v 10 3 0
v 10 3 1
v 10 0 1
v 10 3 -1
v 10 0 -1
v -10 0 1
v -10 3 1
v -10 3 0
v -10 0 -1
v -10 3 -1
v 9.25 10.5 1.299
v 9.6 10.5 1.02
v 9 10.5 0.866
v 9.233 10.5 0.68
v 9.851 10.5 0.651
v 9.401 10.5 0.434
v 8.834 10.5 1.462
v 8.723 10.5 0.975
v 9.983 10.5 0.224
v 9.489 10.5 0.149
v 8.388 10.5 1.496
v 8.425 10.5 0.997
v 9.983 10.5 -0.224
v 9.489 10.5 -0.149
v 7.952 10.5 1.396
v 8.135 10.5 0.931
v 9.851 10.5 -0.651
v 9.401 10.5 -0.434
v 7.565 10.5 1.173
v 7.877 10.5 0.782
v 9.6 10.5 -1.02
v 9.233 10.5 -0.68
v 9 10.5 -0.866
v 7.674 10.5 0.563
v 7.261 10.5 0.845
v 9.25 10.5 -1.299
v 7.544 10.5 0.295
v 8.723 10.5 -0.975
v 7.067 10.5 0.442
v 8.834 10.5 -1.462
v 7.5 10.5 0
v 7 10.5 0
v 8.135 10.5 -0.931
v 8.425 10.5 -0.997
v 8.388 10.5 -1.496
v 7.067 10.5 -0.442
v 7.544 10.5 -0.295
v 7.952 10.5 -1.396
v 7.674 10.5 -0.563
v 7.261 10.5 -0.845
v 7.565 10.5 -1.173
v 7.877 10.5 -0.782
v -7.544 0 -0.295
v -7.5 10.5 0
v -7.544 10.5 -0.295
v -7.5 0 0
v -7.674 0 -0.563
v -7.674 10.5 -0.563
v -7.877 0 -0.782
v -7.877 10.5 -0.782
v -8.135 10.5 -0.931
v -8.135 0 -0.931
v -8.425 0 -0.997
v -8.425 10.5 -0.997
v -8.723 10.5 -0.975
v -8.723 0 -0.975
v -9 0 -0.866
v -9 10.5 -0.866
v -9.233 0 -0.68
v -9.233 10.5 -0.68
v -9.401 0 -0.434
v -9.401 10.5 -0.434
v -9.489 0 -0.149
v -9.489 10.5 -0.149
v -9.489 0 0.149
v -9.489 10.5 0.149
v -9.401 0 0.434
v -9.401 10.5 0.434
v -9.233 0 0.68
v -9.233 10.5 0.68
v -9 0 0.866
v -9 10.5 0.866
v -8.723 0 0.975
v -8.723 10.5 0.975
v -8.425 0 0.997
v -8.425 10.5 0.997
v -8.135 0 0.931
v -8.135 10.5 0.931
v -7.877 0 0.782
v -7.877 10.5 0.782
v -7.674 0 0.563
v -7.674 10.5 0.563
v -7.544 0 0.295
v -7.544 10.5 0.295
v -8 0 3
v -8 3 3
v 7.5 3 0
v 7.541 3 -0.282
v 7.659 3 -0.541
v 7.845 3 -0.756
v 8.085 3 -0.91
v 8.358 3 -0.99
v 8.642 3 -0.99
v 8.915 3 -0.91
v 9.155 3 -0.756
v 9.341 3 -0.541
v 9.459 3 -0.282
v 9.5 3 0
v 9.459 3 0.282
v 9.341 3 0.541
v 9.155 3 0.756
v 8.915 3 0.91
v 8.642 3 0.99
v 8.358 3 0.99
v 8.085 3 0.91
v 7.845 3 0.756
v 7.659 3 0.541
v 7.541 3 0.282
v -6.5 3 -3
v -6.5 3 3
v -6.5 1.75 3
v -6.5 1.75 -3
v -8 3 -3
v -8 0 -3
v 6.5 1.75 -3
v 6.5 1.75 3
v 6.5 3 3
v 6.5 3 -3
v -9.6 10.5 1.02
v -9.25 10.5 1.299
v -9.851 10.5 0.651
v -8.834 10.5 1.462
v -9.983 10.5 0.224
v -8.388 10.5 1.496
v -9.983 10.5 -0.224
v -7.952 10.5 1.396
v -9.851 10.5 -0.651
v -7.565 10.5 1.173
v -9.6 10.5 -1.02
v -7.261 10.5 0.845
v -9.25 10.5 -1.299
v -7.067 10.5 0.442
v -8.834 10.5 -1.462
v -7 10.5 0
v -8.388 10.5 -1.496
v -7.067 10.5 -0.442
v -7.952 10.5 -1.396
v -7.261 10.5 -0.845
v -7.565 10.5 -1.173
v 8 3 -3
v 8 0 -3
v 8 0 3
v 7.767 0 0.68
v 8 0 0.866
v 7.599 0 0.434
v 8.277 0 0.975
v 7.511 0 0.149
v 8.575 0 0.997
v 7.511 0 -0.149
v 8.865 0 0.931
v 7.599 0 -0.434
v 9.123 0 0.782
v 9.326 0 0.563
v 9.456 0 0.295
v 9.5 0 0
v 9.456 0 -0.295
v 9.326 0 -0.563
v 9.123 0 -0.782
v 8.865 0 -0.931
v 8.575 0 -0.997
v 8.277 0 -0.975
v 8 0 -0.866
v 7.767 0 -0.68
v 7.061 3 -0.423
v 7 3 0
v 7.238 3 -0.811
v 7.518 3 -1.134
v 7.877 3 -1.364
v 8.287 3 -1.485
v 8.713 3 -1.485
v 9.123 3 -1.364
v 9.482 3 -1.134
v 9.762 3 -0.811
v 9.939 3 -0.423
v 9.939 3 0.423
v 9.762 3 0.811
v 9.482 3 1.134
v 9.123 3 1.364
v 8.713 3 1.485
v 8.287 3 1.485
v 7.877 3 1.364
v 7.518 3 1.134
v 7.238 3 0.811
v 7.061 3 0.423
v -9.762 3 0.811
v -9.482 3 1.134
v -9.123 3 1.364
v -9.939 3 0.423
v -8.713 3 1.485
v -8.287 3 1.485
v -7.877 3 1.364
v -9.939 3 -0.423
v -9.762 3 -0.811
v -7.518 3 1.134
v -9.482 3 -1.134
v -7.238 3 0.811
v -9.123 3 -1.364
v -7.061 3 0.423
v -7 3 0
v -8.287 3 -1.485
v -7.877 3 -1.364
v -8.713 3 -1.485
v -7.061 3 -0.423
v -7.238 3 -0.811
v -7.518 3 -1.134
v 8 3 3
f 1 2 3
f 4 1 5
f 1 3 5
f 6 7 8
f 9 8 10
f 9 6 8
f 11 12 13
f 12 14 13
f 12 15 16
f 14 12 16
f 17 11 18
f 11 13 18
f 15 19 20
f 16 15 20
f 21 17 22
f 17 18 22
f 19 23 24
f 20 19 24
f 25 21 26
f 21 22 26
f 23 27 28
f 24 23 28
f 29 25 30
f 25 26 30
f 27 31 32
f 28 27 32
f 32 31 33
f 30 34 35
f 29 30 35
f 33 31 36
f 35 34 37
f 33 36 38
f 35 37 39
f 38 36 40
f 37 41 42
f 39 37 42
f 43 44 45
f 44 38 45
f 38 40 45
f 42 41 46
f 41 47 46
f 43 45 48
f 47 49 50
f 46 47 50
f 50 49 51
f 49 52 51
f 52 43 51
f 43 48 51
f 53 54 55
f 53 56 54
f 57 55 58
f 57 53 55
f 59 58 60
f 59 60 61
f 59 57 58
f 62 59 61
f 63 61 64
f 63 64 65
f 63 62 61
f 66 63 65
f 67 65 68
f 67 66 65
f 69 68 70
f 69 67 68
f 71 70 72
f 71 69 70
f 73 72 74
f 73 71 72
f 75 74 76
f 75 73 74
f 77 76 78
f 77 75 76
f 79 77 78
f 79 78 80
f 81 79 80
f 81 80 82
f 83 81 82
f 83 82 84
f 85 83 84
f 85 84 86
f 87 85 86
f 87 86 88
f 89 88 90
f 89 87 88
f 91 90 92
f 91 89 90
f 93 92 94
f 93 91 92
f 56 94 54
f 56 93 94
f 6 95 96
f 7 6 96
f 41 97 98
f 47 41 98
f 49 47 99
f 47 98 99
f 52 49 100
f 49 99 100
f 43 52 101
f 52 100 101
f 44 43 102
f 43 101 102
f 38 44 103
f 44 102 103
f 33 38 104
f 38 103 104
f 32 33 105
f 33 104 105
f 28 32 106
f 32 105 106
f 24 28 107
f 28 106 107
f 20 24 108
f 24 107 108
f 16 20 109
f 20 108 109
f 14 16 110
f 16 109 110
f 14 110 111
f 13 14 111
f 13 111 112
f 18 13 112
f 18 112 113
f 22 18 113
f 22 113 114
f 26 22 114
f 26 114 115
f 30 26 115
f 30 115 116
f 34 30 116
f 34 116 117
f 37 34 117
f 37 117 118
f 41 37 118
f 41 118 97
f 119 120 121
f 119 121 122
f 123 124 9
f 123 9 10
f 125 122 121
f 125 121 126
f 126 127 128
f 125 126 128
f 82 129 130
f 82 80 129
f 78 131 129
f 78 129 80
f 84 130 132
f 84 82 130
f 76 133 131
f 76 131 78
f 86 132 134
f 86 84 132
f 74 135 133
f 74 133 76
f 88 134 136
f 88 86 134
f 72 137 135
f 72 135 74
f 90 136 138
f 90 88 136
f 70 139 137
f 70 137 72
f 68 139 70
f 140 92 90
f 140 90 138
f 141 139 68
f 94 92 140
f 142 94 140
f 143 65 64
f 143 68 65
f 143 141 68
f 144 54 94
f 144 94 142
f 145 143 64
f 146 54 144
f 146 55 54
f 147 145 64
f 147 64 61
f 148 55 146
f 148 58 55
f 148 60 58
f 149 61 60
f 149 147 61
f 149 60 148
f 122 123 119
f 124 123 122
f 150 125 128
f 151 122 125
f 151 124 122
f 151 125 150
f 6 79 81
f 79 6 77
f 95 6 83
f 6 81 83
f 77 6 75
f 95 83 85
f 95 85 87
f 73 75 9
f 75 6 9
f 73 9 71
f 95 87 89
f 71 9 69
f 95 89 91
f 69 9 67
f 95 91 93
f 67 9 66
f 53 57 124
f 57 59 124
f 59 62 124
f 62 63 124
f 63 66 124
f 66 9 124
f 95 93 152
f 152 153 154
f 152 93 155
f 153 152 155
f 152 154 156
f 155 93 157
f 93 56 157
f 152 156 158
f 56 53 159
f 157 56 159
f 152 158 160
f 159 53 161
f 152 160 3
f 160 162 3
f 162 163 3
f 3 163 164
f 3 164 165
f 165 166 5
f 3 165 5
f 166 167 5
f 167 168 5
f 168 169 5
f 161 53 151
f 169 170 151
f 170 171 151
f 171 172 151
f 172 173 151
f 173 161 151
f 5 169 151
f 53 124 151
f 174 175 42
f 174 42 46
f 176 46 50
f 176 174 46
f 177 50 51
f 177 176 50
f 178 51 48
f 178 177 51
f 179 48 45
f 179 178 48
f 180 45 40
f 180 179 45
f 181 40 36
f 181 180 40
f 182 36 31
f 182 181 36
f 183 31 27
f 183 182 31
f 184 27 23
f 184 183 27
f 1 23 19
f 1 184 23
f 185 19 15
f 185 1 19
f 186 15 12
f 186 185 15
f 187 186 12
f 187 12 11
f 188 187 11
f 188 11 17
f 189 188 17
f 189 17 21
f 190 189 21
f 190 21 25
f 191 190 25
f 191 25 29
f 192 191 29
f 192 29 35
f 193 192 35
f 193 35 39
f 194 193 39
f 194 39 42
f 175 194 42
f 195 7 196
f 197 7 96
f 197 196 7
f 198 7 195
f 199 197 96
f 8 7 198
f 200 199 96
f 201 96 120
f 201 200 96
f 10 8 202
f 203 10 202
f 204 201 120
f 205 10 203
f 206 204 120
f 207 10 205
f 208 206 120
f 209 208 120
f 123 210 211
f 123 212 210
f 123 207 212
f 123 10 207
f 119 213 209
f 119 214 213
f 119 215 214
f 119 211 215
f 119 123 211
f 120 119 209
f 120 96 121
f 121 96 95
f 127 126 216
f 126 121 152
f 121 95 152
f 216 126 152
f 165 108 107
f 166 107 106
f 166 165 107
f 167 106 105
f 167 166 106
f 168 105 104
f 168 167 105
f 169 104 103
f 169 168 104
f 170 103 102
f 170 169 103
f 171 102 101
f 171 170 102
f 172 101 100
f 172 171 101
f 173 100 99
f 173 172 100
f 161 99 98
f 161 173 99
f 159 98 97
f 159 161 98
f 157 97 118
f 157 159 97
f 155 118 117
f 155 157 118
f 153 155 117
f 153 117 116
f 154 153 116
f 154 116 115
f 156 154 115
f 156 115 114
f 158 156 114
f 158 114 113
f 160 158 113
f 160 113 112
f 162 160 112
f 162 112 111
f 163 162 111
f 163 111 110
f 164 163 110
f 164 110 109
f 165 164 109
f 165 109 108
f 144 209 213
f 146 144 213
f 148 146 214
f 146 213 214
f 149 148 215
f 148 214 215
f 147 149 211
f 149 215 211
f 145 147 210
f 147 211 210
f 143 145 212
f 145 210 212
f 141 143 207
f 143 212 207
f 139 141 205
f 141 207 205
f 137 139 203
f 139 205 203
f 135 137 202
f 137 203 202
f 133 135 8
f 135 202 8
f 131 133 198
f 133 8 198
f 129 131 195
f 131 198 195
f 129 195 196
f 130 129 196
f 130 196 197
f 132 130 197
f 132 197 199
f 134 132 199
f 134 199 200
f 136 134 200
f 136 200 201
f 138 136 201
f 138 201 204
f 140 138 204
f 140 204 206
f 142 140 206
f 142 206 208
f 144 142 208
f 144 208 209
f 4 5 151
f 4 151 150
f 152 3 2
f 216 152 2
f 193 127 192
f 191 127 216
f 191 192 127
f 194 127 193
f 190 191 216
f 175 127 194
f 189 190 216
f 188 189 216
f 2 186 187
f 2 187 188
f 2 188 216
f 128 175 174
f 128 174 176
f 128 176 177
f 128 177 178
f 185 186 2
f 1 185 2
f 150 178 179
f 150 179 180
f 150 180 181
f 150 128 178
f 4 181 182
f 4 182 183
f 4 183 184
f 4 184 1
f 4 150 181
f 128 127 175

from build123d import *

# Parameters (mm, degrees)
SKETCH1_W           = 20
SKETCH1_H           = 6
SKETCH1_R           = 1
BOSS_EXTRUDE1_DEPTH = 3
SKETCH2_W           = 13
SKETCH2_H           = 6
CUT_EXTRUDE1_DEPTH  = 1.25
CHAMFER1_SIZE       = 2
SKETCH3_R           = 1.5
SKETCH3_R_2         = 1
BOSS_EXTRUDE2_DEPTH = 7.5


with BuildPart() as part:
    # Sketch1 → Boss-Extrude1 (new body)
    with BuildSketch(Plane(origin=(0, 0, 0), x_dir=(1, 0, 0), z_dir=(0, 1, 0))):
        Rectangle(SKETCH1_W, SKETCH1_H)
        with Locations((-8.5, 0)):
            Circle(SKETCH1_R, mode=Mode.SUBTRACT)
        with Locations((8.5, 0)):
            Circle(SKETCH1_R, mode=Mode.SUBTRACT)
    extrude(amount=BOSS_EXTRUDE1_DEPTH)

    # Sketch2 → Cut-Extrude1 (cut)
    with BuildSketch(Plane(origin=(0, 3, 0), x_dir=(1, 0, 0), z_dir=(0, 1, 0))):
        Rectangle(SKETCH2_W, SKETCH2_H)
    extrude(amount=-CUT_EXTRUDE1_DEPTH, mode=Mode.SUBTRACT)

    # Chamfer1
    chamfer1_edges = [part.edges().sort_by_distance(p)[0] for p in [
        (10, 1.5, 3),
        (-10, 1.5, 3),
        (-10, 1.5, -3),
        (10, 1.5, -3),
    ]]
    chamfer(chamfer1_edges, length=CHAMFER1_SIZE)

    # Sketch3 → Boss-Extrude2 (add)
    with BuildSketch(Plane(origin=(0, 3, 0), x_dir=(1, 0, 0), z_dir=(0, 1, 0))):
        with Locations((-8.5, 0)):
            Circle(SKETCH3_R)
        with Locations((-8.5, 0)):
            Circle(SKETCH3_R_2, mode=Mode.SUBTRACT)
    boss_extrude2 = extrude(amount=BOSS_EXTRUDE2_DEPTH)

    # Mirror1: Boss-Extrude2 across plane
    add(boss_extrude2.mirror(Plane(origin=(0, 0, 0), x_dir=(0, 0, 1), z_dir=(1, 0, 0))))


solid = part.part
